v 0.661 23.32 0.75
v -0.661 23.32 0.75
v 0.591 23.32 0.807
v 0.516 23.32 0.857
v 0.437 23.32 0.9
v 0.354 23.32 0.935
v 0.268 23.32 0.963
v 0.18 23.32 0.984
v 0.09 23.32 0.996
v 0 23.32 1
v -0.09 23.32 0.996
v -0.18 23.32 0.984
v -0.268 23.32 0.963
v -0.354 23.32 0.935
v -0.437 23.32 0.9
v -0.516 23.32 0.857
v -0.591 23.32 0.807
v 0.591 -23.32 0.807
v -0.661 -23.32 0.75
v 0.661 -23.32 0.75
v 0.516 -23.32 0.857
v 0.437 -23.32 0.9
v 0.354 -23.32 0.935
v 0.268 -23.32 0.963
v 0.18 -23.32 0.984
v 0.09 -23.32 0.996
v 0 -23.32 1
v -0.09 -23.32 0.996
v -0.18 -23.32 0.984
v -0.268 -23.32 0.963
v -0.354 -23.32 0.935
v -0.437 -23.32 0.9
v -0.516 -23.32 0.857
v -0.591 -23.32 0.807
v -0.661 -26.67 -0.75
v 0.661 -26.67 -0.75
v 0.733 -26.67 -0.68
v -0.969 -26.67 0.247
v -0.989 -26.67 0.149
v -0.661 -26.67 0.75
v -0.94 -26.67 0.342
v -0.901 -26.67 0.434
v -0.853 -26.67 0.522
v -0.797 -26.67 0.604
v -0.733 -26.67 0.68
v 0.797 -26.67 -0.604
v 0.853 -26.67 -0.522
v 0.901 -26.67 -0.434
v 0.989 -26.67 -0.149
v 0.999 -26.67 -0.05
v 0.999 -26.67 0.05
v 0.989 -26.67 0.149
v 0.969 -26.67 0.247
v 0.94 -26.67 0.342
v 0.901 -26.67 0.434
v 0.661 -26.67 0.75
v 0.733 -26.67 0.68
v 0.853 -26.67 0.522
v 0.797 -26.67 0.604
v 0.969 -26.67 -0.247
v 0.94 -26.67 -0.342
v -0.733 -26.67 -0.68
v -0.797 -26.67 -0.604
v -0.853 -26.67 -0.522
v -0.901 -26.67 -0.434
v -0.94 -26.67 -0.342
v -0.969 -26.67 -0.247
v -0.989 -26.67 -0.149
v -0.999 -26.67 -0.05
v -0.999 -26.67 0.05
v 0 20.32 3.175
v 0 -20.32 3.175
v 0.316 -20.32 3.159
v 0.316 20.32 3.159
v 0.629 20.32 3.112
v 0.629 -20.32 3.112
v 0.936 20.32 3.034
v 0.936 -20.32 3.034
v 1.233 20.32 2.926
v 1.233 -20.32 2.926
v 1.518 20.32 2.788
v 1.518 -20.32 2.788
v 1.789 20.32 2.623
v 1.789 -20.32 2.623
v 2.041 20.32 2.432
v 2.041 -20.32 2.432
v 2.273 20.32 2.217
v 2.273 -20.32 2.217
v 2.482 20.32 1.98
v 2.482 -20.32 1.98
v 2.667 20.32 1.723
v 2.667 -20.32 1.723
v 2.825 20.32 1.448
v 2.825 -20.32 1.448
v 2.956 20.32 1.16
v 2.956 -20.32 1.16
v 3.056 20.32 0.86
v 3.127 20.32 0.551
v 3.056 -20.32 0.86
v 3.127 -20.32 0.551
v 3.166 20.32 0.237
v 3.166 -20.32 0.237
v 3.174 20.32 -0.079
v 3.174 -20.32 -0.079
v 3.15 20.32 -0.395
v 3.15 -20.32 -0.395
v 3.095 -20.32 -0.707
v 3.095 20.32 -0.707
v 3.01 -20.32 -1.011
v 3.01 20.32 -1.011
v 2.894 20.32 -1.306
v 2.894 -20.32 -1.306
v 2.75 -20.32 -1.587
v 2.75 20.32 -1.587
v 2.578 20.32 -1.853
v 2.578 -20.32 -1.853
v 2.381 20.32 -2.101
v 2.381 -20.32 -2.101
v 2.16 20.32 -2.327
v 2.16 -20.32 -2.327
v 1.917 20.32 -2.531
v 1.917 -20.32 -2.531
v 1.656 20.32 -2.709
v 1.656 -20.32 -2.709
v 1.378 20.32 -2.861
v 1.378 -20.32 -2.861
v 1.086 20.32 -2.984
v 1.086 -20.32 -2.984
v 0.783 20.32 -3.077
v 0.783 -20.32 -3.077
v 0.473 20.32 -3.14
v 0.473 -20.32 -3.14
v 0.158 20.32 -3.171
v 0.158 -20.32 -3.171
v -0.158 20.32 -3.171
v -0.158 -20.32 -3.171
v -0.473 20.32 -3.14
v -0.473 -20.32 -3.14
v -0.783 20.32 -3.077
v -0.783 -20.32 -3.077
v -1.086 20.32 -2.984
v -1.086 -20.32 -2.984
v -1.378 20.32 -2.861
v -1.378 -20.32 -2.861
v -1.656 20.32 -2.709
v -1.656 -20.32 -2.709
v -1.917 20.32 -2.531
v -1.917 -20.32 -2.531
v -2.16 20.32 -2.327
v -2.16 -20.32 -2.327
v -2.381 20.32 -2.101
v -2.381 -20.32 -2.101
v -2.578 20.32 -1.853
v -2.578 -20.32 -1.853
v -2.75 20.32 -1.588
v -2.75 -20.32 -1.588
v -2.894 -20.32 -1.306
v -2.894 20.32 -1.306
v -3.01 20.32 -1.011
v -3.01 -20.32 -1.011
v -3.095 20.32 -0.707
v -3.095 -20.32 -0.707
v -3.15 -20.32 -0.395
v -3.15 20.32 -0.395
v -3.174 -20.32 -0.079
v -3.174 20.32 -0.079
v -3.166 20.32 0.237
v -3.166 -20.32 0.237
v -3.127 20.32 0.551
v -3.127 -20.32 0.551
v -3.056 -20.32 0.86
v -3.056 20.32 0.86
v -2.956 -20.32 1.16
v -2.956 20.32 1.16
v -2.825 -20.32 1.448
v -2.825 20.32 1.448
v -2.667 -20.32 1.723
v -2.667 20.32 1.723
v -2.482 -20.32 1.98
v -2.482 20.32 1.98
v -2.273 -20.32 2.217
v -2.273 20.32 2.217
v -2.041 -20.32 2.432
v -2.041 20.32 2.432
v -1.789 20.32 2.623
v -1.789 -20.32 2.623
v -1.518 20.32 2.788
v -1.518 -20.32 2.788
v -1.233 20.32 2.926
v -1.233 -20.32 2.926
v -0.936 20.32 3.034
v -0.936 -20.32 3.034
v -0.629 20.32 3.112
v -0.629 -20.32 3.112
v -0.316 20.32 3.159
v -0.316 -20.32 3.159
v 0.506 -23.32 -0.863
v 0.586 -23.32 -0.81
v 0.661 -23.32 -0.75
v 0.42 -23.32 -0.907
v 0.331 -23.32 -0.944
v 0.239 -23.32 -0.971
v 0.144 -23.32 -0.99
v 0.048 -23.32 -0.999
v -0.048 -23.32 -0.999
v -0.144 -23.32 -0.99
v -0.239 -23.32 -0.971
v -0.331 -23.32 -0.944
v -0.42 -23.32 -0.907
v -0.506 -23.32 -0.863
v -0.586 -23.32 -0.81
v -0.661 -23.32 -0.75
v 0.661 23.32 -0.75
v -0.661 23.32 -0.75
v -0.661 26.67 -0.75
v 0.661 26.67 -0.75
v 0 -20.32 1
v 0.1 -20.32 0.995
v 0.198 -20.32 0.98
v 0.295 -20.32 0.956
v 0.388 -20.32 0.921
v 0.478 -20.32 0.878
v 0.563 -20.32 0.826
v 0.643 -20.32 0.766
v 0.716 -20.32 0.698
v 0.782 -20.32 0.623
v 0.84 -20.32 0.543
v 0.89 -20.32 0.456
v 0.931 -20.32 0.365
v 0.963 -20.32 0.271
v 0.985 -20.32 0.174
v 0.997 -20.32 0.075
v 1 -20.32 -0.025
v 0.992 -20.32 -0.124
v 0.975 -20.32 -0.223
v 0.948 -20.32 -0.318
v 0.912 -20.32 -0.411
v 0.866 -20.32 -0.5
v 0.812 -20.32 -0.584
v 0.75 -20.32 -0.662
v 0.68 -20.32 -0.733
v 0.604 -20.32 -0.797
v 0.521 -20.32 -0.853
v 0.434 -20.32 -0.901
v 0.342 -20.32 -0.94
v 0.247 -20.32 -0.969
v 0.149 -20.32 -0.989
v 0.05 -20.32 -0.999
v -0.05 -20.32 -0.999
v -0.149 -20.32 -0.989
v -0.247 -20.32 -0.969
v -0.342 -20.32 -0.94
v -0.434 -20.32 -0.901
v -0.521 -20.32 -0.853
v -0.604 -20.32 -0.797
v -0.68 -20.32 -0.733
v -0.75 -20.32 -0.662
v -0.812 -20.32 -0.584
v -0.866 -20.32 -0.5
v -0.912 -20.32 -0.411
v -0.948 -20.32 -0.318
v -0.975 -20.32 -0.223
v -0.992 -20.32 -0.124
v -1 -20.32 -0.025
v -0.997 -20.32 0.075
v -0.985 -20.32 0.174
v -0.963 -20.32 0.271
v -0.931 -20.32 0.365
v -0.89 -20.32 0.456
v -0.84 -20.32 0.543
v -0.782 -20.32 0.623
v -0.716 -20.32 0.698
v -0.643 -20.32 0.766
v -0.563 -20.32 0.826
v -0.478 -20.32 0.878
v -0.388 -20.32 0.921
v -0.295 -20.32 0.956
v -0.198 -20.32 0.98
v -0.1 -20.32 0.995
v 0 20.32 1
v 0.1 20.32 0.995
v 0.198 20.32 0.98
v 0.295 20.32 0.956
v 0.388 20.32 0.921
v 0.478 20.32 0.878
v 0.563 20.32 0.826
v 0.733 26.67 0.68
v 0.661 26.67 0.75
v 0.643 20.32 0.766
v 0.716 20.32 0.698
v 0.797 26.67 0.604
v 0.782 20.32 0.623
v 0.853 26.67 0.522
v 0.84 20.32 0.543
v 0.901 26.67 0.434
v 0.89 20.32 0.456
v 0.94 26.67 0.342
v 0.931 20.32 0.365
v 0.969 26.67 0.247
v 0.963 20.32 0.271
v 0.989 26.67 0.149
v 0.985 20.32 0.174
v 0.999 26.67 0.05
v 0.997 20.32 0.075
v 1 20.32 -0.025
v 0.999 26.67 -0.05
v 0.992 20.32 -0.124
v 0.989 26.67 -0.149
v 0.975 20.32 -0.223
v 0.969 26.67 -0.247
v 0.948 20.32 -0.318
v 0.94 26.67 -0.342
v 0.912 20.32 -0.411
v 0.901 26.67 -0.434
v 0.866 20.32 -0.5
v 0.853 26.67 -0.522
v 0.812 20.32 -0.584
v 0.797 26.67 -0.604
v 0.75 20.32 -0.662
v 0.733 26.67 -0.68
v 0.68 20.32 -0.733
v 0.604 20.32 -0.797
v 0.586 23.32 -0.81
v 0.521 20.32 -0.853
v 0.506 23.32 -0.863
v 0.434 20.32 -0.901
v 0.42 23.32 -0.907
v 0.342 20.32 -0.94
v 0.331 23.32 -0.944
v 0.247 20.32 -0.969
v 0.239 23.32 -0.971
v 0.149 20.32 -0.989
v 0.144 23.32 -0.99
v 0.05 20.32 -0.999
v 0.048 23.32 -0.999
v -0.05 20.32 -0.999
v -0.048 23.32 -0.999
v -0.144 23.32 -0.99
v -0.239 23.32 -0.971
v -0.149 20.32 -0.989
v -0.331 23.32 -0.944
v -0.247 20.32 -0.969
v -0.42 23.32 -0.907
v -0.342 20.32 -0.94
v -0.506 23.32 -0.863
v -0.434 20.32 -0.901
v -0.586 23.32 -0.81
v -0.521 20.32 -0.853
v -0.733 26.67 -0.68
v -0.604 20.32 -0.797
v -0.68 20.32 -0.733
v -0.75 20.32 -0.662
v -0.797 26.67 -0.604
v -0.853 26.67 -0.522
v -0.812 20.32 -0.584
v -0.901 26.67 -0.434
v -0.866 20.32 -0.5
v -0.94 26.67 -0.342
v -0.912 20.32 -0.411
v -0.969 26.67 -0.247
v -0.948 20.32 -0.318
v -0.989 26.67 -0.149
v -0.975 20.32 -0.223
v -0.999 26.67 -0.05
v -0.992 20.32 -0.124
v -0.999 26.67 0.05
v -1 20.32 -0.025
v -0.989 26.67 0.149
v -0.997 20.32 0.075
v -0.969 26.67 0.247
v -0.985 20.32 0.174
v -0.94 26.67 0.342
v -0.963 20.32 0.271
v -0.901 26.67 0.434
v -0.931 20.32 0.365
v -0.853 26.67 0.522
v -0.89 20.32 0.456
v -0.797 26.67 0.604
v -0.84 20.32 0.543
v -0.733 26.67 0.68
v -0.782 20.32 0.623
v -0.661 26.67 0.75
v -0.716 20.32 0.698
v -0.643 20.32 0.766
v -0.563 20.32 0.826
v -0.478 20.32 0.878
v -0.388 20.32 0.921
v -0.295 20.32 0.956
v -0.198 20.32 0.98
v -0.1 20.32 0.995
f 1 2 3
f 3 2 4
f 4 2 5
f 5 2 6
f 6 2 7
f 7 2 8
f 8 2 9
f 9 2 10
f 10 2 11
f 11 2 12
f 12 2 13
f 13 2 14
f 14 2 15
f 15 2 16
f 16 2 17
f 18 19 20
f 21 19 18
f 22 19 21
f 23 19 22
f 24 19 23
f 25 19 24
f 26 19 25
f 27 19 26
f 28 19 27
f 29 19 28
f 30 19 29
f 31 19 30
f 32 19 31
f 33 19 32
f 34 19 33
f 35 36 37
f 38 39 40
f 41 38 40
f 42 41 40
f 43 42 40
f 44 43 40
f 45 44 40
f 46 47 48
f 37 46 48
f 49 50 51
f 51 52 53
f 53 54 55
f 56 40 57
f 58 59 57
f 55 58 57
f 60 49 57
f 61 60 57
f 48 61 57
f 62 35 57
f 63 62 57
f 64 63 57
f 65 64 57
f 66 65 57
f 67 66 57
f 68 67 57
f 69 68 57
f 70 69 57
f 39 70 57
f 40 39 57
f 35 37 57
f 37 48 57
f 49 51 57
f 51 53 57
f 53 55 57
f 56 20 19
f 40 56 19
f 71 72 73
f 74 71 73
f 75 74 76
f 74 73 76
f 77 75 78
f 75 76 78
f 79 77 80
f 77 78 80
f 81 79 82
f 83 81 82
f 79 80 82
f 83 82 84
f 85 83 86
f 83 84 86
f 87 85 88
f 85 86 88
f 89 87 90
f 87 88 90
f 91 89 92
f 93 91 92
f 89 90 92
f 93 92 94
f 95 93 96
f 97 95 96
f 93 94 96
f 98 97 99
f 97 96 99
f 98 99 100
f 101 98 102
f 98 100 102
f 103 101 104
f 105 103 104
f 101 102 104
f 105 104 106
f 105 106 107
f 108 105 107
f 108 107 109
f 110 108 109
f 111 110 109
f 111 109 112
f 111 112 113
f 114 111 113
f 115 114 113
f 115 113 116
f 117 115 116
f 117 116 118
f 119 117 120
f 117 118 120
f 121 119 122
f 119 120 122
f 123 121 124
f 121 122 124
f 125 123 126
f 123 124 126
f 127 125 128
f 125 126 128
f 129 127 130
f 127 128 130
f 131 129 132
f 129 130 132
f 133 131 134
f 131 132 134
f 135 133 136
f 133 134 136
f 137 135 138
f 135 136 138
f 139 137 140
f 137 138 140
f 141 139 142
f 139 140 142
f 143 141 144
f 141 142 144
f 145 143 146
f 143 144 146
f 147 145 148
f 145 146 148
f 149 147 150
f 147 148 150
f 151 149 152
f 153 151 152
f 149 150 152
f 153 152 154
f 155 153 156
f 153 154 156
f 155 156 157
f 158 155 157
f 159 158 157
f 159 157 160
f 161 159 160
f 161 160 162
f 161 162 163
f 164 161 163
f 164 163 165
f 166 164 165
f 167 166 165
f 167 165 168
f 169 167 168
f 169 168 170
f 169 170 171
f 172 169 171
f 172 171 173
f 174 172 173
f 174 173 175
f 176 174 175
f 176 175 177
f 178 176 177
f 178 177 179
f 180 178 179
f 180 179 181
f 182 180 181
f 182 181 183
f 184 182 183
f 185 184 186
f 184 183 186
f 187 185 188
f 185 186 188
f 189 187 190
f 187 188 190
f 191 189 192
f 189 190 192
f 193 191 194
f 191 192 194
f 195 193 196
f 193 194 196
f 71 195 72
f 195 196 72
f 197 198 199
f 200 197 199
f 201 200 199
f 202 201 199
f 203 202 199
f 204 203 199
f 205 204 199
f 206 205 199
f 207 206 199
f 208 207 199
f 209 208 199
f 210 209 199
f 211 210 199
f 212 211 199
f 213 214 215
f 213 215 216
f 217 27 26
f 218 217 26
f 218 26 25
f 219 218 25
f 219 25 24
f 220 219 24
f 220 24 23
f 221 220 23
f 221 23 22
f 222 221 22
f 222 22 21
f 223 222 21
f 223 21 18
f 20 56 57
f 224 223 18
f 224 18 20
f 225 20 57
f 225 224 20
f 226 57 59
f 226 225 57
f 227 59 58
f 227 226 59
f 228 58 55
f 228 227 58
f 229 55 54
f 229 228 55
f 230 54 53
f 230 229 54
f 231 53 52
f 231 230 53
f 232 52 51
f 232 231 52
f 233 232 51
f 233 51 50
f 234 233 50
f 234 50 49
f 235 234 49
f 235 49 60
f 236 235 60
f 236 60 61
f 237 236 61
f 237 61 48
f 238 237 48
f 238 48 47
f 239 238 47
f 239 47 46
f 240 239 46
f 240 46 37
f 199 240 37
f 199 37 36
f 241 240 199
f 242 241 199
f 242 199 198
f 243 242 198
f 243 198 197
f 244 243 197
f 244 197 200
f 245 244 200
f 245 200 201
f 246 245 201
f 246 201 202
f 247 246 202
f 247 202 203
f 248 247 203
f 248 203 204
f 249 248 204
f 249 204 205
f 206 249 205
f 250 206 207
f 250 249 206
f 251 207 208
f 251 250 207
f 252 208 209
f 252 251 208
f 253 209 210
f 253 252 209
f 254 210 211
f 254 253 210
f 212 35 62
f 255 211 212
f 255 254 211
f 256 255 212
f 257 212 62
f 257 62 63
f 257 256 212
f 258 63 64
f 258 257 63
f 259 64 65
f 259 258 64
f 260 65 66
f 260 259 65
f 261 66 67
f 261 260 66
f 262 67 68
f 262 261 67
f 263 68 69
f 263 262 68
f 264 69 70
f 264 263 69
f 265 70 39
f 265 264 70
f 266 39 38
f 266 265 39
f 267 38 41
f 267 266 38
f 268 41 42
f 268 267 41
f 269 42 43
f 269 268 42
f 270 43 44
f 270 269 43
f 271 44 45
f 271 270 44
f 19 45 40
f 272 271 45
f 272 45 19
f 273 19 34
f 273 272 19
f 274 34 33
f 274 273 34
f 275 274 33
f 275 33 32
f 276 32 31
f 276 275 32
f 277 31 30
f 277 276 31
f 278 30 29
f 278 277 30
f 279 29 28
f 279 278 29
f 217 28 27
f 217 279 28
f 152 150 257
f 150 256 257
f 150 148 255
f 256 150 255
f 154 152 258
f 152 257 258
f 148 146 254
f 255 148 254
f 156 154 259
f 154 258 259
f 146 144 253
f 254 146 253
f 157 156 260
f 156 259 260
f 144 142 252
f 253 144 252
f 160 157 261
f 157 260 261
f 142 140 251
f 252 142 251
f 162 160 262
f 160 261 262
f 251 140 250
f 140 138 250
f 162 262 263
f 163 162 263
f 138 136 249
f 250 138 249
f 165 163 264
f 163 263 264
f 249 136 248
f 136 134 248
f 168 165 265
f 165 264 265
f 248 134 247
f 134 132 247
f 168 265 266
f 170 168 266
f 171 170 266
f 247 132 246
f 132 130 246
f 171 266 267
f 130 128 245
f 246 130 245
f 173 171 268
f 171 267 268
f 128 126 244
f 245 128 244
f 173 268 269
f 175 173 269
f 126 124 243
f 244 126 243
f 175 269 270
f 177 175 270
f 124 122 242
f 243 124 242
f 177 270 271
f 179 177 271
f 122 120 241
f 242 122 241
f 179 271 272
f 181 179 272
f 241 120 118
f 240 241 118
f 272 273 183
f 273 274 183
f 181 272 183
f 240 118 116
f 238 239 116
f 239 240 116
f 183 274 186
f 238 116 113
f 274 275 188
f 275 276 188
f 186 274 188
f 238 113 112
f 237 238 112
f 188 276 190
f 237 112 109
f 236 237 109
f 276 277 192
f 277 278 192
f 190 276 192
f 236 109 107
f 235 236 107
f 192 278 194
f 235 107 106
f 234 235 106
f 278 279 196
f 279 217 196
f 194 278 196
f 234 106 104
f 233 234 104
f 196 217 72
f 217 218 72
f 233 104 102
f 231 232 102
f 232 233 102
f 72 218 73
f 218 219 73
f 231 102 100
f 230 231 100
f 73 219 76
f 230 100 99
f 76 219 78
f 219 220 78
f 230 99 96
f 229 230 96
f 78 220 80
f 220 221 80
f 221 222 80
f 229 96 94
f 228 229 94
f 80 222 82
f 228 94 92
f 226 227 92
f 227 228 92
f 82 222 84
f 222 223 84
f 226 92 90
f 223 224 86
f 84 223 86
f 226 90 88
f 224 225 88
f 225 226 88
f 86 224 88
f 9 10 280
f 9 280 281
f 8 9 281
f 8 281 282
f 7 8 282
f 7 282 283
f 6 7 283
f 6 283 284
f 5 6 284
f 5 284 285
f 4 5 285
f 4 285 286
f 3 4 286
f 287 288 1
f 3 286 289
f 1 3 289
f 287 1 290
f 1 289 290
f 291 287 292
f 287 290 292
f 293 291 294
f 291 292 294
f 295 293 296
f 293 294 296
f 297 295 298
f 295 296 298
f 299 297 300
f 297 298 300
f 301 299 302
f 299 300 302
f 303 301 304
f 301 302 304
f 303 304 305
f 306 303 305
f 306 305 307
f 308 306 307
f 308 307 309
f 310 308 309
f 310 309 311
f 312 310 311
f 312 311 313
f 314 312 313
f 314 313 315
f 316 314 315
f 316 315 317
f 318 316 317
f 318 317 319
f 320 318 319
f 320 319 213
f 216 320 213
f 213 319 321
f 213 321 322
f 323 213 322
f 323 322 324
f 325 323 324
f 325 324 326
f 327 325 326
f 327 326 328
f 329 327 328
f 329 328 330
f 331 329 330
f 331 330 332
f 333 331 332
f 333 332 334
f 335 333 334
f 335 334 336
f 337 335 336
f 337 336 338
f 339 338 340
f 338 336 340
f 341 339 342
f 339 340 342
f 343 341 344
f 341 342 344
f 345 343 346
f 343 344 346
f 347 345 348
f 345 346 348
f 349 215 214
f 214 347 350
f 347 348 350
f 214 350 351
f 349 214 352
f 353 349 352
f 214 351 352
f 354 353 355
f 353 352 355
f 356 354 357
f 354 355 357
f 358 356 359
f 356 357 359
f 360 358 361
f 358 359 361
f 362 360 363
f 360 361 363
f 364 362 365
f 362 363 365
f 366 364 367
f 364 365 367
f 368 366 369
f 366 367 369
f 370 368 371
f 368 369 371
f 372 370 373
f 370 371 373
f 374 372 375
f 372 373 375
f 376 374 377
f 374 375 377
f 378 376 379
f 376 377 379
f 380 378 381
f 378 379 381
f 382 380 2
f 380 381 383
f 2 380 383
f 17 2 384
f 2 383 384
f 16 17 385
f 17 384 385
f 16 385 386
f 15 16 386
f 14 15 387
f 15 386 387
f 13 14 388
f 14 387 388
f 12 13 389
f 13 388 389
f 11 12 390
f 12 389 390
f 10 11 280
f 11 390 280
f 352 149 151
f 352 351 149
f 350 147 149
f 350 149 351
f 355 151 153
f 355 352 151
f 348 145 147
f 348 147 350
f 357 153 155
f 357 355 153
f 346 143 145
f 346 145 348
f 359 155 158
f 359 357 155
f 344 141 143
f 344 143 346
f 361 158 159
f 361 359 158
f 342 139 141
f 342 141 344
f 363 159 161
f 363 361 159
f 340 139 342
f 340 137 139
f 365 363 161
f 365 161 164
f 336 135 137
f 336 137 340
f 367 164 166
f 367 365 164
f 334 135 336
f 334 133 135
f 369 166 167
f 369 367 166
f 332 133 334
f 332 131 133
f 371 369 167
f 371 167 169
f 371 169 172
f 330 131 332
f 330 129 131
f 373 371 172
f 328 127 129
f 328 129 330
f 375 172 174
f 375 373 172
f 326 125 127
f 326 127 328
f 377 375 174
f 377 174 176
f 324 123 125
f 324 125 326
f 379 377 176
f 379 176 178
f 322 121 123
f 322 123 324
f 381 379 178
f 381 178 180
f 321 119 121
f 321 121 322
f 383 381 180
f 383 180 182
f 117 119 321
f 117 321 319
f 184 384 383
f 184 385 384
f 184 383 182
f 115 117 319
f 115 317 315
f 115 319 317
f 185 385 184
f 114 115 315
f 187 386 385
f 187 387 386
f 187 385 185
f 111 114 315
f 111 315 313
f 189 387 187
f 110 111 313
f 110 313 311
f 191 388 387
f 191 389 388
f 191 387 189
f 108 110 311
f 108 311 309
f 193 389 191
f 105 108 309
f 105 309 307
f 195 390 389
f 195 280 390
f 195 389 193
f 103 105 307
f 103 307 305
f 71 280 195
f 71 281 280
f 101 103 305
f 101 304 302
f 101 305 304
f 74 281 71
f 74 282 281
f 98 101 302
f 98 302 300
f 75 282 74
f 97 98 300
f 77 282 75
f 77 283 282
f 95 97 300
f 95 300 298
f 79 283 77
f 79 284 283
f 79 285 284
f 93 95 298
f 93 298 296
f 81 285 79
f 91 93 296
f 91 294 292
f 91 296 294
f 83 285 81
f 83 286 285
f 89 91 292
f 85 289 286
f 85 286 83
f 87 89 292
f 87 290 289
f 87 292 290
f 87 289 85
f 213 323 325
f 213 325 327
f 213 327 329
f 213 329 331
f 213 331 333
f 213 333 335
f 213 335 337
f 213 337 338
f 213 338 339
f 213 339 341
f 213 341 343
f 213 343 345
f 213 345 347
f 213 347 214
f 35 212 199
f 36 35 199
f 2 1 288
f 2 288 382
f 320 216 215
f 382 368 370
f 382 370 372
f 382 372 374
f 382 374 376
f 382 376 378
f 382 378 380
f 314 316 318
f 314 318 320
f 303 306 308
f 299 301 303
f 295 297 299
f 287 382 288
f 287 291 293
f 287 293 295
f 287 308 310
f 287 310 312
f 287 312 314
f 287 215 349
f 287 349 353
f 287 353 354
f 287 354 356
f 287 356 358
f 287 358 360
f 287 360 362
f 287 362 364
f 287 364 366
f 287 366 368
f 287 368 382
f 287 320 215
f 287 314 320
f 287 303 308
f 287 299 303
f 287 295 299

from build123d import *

# Parameters (mm, degrees)
BOSS_EXTRUDE1_DEPTH      = 20.32
BOSS_EXTRUDE1_DEPTH_BACK = 20.32
SKETCH1_R                = 3.175
SKETCH2_R                = 1
BOSS_EXTRUDE2_DEPTH      = 6.35
CUT_EXTRUDE1_DEPTH       = 6.35


with BuildPart() as part:
    # Sketch1 → Boss-Extrude1 (new, two sides: drawn at the far end of the back side and taken through both)
    with BuildSketch(Plane(origin=(0, 0, 0), x_dir=(1, 0, 0), z_dir=(0, 1, 0)).offset(-BOSS_EXTRUDE1_DEPTH_BACK)):
        Circle(SKETCH1_R)
    extrude(amount=BOSS_EXTRUDE1_DEPTH + BOSS_EXTRUDE1_DEPTH_BACK)

    # Sketch2 → Boss-Extrude2 (add)
    with BuildSketch(Plane(origin=(0, 20.32, 0), x_dir=(1, 0, 0), z_dir=(0, 1, 0))):
        Circle(SKETCH2_R)
    boss_extrude2 = extrude(amount=BOSS_EXTRUDE2_DEPTH)

    # Sketch3 → Cut-Extrude1 (cut)
    with BuildSketch(Plane(origin=(0, 23.320000096, 0), x_dir=(1, 0, 0), z_dir=(0, 1, 0))):
        with BuildLine():
            Line((0.661437828, -0.75), (-0.661437828, -0.75))
            ThreePointArc((-0.661437828, -0.75), (0, -1), (0.661437828, -0.75))
        make_face()
        with BuildLine():
            ThreePointArc((0.661437828, 0.75), (0, 1), (-0.661437828, 0.75))
            Line((-0.661437828, 0.75), (0.661437828, 0.75))
        make_face()
    cut_extrude1 = extrude(amount=CUT_EXTRUDE1_DEPTH, mode=Mode.SUBTRACT)

    # Mirror1: Boss-Extrude2, Cut-Extrude1 across plane
    add(boss_extrude2.mirror(Plane.ZX))
    add(cut_extrude1.mirror(Plane.ZX), mode=Mode.SUBTRACT)


solid = part.part
